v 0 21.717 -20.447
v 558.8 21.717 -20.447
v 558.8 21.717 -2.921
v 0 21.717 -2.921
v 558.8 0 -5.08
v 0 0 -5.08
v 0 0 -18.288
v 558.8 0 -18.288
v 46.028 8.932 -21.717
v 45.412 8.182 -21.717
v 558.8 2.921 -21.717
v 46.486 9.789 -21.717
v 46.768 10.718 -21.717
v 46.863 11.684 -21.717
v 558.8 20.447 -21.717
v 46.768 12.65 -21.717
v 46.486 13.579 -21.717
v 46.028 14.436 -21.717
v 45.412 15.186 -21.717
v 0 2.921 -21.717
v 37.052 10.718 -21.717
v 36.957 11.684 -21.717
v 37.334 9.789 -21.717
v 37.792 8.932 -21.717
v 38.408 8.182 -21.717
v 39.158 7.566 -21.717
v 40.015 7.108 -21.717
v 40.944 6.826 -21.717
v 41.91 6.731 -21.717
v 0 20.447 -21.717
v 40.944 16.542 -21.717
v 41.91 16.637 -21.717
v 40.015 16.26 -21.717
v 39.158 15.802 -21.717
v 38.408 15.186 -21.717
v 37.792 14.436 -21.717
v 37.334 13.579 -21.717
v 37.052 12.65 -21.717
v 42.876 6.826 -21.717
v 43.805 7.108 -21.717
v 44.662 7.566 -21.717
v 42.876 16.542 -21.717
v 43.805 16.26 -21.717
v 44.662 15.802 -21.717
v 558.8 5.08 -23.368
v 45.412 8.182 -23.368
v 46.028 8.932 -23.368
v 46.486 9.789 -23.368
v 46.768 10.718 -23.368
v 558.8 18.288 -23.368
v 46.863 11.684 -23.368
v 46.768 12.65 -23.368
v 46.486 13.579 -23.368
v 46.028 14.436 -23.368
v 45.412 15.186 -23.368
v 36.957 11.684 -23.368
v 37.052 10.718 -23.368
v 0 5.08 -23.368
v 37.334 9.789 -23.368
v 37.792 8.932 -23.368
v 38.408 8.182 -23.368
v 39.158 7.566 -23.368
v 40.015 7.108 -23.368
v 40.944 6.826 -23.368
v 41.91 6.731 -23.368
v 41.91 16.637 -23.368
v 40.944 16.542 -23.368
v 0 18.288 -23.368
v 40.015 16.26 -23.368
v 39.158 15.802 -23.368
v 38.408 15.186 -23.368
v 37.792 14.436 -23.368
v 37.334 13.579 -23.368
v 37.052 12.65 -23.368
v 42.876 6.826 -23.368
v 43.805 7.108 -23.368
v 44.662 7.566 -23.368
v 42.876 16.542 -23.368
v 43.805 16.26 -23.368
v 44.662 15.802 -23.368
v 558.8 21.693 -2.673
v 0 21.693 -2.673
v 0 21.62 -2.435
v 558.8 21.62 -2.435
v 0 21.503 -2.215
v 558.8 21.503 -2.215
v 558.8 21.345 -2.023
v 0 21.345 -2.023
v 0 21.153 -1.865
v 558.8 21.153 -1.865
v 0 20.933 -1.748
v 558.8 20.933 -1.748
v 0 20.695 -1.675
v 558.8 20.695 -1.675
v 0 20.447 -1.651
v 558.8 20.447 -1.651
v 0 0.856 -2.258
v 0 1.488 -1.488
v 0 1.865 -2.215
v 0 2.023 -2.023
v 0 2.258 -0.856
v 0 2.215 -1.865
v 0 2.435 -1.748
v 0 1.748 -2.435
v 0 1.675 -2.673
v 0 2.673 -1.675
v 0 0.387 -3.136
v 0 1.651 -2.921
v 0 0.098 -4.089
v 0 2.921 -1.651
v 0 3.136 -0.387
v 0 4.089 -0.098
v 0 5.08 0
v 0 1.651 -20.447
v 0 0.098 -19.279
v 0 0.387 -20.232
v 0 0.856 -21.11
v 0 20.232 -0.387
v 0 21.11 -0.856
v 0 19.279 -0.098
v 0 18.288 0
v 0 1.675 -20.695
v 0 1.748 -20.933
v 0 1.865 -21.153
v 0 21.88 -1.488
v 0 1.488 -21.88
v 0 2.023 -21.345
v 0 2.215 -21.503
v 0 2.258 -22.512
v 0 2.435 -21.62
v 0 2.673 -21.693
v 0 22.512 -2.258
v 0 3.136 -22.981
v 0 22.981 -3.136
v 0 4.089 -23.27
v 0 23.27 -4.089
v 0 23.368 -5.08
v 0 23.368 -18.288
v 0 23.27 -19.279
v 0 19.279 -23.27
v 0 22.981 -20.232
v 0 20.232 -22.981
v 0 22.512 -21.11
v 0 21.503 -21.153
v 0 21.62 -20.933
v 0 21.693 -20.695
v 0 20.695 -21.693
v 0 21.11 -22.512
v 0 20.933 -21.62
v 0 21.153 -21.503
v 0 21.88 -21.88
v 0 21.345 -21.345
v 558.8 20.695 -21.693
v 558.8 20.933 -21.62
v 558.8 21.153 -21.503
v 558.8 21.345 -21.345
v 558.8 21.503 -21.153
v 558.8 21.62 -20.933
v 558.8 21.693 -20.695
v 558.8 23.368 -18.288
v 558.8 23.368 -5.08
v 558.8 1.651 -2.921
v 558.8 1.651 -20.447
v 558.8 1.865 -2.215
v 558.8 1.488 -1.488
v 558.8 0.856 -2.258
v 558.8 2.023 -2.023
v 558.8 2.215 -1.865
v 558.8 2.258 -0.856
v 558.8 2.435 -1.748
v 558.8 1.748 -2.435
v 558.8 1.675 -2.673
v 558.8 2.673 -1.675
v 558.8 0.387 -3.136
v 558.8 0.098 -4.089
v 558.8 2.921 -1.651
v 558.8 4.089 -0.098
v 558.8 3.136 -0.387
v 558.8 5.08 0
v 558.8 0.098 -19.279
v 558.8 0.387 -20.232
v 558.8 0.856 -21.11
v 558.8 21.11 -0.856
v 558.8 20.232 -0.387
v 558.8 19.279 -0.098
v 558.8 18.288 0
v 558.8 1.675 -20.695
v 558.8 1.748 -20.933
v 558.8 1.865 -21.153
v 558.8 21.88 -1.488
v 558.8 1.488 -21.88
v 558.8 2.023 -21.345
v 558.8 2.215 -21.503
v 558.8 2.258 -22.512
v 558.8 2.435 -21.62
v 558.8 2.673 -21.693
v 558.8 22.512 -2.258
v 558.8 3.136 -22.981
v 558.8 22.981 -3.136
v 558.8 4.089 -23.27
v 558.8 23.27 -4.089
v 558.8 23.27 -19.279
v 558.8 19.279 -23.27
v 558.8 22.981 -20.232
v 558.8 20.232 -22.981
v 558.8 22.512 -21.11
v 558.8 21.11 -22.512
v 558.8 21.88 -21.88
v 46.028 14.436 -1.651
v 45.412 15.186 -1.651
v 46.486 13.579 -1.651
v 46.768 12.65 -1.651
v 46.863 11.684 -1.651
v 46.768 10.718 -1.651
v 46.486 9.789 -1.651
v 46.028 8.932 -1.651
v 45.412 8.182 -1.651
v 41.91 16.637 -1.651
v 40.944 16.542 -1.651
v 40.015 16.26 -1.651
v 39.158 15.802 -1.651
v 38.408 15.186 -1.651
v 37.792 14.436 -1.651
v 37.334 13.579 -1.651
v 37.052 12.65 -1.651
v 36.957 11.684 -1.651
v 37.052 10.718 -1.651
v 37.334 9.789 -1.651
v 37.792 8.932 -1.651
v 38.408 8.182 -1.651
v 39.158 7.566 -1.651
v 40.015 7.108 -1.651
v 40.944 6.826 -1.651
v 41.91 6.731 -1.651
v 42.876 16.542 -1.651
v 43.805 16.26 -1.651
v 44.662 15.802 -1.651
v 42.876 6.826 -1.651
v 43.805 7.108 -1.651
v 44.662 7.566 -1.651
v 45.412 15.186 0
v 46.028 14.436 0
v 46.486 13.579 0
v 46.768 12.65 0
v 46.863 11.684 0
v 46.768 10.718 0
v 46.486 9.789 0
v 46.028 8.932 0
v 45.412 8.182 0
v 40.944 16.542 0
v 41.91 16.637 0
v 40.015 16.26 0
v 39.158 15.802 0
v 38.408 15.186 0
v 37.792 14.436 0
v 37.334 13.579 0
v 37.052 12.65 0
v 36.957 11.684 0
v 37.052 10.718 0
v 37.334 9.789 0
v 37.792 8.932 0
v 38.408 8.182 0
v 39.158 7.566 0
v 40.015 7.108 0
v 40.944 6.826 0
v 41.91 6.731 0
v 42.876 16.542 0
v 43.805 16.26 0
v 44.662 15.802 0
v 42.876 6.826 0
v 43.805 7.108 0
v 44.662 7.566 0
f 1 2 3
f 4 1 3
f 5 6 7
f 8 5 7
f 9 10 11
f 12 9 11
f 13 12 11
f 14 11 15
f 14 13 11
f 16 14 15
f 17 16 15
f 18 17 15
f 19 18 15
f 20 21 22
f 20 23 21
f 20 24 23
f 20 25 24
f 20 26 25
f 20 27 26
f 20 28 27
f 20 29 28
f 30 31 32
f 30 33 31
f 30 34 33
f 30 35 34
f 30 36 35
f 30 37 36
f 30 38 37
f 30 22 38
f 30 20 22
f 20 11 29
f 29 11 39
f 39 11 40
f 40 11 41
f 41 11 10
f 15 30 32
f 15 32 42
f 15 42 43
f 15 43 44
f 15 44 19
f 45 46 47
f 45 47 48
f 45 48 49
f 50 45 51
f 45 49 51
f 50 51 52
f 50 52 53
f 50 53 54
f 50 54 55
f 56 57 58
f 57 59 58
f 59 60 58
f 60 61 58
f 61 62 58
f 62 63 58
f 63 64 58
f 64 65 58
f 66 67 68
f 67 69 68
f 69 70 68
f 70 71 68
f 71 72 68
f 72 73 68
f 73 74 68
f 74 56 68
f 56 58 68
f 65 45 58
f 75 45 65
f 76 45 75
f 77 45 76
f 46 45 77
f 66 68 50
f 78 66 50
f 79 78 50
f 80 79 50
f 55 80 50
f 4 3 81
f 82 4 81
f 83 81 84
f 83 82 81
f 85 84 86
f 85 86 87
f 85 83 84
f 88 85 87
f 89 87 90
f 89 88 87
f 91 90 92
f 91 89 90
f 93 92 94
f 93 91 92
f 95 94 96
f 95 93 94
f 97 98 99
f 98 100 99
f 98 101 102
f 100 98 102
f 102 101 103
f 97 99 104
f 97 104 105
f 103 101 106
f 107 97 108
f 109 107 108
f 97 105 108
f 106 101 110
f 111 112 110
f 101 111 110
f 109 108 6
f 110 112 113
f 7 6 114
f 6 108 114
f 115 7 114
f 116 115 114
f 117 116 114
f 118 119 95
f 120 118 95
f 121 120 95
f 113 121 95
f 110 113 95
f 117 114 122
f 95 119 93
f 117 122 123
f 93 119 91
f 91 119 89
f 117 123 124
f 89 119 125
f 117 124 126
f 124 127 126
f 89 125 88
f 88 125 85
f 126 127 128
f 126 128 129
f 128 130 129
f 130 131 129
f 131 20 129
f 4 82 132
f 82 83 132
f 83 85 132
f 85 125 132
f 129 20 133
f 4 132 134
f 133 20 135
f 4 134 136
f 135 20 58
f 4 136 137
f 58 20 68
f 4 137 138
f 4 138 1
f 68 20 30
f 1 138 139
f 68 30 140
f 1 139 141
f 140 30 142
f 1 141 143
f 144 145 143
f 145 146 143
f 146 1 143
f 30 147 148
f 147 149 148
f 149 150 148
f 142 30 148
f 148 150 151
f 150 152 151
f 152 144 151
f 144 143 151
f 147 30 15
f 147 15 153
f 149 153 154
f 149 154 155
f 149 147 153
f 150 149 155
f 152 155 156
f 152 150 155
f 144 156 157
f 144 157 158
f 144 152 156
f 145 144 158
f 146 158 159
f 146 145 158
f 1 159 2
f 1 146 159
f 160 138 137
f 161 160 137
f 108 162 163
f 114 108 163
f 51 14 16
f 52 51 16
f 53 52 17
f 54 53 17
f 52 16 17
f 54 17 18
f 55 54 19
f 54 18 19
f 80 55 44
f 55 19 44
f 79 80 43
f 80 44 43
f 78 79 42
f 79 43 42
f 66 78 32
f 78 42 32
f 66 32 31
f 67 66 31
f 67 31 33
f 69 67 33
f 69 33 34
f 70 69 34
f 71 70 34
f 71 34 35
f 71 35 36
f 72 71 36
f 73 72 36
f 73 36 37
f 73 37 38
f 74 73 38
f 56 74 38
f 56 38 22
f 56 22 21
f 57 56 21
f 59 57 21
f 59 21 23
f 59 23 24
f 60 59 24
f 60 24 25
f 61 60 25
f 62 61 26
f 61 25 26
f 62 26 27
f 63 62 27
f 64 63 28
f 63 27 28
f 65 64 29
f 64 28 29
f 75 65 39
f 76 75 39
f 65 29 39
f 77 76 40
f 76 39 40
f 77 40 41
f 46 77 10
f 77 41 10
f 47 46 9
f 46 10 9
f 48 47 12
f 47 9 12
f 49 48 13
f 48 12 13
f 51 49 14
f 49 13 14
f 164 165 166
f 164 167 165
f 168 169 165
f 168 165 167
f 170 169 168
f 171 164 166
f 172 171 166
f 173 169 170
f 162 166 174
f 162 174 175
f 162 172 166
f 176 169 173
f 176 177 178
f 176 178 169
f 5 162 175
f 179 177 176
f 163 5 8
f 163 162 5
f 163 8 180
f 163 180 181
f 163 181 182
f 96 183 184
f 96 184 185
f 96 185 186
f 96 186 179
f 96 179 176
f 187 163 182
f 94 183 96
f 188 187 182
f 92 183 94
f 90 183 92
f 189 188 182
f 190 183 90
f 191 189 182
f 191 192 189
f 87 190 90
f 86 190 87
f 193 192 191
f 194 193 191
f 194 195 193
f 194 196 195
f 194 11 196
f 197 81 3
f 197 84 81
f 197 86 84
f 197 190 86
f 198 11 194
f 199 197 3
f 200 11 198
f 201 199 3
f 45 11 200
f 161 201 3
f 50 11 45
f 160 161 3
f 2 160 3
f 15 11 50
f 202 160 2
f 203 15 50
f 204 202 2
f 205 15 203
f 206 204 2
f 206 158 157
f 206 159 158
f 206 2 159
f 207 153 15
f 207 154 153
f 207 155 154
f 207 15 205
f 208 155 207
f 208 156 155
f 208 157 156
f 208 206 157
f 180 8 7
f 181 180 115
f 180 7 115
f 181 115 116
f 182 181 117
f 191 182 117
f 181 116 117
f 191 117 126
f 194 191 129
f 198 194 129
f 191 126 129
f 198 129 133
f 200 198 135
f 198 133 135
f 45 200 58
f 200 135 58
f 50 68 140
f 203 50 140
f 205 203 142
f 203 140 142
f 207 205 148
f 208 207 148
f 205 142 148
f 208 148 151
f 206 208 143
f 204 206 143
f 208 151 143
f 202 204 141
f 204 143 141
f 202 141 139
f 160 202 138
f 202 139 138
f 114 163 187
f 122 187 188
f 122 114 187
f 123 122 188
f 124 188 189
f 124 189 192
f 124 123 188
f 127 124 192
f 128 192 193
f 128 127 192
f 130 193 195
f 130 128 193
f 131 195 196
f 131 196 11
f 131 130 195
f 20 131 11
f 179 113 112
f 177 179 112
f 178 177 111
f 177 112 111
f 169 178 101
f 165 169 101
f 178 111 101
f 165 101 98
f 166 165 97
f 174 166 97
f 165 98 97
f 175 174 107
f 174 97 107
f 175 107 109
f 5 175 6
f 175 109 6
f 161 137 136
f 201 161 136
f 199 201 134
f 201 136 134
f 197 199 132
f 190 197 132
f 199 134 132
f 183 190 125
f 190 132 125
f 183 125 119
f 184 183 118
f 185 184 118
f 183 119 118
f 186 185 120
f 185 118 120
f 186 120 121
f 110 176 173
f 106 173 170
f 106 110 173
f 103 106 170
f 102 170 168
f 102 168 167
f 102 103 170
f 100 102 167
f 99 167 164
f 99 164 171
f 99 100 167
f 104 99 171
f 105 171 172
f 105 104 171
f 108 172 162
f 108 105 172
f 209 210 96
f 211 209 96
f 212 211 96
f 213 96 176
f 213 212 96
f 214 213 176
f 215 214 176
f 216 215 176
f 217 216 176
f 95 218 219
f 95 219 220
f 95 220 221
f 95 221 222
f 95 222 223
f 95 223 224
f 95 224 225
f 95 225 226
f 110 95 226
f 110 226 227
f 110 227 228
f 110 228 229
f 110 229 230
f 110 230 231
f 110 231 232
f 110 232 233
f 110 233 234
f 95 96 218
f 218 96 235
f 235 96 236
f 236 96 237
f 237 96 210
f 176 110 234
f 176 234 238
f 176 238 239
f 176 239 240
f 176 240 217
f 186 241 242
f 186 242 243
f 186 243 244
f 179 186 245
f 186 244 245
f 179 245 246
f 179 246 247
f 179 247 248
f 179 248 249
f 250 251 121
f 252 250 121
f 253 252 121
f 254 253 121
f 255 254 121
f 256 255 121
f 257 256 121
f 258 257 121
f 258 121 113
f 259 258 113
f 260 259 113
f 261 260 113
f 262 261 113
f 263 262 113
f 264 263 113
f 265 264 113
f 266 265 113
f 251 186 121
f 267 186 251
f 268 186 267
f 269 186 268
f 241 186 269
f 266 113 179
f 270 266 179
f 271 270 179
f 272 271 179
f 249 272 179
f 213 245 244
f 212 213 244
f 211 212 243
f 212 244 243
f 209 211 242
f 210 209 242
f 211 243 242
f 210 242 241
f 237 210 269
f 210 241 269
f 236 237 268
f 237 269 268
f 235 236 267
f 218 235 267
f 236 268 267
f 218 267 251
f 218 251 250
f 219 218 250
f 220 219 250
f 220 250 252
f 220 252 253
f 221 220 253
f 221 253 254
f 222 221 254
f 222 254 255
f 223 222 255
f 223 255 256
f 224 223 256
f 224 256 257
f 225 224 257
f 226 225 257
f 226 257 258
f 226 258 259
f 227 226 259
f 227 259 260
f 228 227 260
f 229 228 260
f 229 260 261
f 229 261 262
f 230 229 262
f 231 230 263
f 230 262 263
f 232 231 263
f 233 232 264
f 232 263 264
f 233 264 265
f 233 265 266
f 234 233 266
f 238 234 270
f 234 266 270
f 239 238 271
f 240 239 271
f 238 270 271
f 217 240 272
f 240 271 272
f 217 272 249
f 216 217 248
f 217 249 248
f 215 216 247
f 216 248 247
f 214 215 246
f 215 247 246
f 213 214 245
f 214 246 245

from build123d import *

# Parameters (mm, degrees)
BOSS_EXTRUDE1_DEPTH = 558.8
CUT_EXTRUDE1_REACH  = 561.776
SKETCH3_R           = 4.953


with BuildPart() as part:
    # Sketch2 → Boss-Extrude1 (new body)
    with BuildSketch(Plane(origin=(0, 0, 0), x_dir=(0, 0, -1), z_dir=(1, 0, 0))):
        with BuildLine():
            Line((5.08, 0), (18.288, 0))
            ThreePointArc((18.288, 0), (21.880102448, 1.487897552), (23.368, 5.08))
            Line((23.368, 5.08), (23.368, 18.288))
            ThreePointArc((23.368, 18.288), (21.880102448, 21.880102448), (18.288, 23.368))
            Line((18.288, 23.368), (5.08, 23.368))
            ThreePointArc((5.08, 23.368), (1.487897552, 21.880102448), (0, 18.288))
            Line((0, 18.288), (0, 5.08))
            ThreePointArc((0, 5.08), (1.487897552, 1.487897552), (5.08, 0))
        make_face()
        with BuildLine():
            Line((2.921, 1.651), (20.447, 1.651))
            ThreePointArc((20.447, 1.651), (21.345025612, 2.022974388), (21.717, 2.921))
            Line((21.717, 2.921), (21.717, 20.447))
            ThreePointArc((21.717, 20.447), (21.345025612, 21.345025612), (20.447, 21.717))
            Line((20.447, 21.717), (2.921, 21.717))
            ThreePointArc((2.921, 21.717), (2.022974388, 21.345025612), (1.651, 20.447))
            Line((1.651, 20.447), (1.651, 2.921))
            ThreePointArc((1.651, 2.921), (2.022974388, 2.022974388), (2.921, 1.651))
        make_face(mode=Mode.SUBTRACT)
    extrude(amount=BOSS_EXTRUDE1_DEPTH)

    # Cut-Extrude1: up to this face of the body (flat: up to its plane)
    cut_extrude1_end = Plane(part.part.faces().sort_by_distance((279.4, 11.684, -23.368))[0])
    # Sketch3 → Cut-Extrude1 (cut, up to the picked face)
    with BuildSketch(Plane.XY, mode=Mode.PRIVATE) as cut_extrude1_sk1:
        with Locations((41.91, 11.684)):
            Circle(SKETCH3_R)
    cut_extrude1_tool1 = split(extrude(cut_extrude1_sk1.sketch, amount=-CUT_EXTRUDE1_REACH, mode=Mode.PRIVATE), bisect_by=cut_extrude1_end, keep=Keep.BOTH, mode=Mode.PRIVATE)
    add(cut_extrude1_tool1.solids().sort_by(Axis((41.91, 11.684, 0), (0, 0, -1)))[0], mode=Mode.SUBTRACT)


solid = part.part
